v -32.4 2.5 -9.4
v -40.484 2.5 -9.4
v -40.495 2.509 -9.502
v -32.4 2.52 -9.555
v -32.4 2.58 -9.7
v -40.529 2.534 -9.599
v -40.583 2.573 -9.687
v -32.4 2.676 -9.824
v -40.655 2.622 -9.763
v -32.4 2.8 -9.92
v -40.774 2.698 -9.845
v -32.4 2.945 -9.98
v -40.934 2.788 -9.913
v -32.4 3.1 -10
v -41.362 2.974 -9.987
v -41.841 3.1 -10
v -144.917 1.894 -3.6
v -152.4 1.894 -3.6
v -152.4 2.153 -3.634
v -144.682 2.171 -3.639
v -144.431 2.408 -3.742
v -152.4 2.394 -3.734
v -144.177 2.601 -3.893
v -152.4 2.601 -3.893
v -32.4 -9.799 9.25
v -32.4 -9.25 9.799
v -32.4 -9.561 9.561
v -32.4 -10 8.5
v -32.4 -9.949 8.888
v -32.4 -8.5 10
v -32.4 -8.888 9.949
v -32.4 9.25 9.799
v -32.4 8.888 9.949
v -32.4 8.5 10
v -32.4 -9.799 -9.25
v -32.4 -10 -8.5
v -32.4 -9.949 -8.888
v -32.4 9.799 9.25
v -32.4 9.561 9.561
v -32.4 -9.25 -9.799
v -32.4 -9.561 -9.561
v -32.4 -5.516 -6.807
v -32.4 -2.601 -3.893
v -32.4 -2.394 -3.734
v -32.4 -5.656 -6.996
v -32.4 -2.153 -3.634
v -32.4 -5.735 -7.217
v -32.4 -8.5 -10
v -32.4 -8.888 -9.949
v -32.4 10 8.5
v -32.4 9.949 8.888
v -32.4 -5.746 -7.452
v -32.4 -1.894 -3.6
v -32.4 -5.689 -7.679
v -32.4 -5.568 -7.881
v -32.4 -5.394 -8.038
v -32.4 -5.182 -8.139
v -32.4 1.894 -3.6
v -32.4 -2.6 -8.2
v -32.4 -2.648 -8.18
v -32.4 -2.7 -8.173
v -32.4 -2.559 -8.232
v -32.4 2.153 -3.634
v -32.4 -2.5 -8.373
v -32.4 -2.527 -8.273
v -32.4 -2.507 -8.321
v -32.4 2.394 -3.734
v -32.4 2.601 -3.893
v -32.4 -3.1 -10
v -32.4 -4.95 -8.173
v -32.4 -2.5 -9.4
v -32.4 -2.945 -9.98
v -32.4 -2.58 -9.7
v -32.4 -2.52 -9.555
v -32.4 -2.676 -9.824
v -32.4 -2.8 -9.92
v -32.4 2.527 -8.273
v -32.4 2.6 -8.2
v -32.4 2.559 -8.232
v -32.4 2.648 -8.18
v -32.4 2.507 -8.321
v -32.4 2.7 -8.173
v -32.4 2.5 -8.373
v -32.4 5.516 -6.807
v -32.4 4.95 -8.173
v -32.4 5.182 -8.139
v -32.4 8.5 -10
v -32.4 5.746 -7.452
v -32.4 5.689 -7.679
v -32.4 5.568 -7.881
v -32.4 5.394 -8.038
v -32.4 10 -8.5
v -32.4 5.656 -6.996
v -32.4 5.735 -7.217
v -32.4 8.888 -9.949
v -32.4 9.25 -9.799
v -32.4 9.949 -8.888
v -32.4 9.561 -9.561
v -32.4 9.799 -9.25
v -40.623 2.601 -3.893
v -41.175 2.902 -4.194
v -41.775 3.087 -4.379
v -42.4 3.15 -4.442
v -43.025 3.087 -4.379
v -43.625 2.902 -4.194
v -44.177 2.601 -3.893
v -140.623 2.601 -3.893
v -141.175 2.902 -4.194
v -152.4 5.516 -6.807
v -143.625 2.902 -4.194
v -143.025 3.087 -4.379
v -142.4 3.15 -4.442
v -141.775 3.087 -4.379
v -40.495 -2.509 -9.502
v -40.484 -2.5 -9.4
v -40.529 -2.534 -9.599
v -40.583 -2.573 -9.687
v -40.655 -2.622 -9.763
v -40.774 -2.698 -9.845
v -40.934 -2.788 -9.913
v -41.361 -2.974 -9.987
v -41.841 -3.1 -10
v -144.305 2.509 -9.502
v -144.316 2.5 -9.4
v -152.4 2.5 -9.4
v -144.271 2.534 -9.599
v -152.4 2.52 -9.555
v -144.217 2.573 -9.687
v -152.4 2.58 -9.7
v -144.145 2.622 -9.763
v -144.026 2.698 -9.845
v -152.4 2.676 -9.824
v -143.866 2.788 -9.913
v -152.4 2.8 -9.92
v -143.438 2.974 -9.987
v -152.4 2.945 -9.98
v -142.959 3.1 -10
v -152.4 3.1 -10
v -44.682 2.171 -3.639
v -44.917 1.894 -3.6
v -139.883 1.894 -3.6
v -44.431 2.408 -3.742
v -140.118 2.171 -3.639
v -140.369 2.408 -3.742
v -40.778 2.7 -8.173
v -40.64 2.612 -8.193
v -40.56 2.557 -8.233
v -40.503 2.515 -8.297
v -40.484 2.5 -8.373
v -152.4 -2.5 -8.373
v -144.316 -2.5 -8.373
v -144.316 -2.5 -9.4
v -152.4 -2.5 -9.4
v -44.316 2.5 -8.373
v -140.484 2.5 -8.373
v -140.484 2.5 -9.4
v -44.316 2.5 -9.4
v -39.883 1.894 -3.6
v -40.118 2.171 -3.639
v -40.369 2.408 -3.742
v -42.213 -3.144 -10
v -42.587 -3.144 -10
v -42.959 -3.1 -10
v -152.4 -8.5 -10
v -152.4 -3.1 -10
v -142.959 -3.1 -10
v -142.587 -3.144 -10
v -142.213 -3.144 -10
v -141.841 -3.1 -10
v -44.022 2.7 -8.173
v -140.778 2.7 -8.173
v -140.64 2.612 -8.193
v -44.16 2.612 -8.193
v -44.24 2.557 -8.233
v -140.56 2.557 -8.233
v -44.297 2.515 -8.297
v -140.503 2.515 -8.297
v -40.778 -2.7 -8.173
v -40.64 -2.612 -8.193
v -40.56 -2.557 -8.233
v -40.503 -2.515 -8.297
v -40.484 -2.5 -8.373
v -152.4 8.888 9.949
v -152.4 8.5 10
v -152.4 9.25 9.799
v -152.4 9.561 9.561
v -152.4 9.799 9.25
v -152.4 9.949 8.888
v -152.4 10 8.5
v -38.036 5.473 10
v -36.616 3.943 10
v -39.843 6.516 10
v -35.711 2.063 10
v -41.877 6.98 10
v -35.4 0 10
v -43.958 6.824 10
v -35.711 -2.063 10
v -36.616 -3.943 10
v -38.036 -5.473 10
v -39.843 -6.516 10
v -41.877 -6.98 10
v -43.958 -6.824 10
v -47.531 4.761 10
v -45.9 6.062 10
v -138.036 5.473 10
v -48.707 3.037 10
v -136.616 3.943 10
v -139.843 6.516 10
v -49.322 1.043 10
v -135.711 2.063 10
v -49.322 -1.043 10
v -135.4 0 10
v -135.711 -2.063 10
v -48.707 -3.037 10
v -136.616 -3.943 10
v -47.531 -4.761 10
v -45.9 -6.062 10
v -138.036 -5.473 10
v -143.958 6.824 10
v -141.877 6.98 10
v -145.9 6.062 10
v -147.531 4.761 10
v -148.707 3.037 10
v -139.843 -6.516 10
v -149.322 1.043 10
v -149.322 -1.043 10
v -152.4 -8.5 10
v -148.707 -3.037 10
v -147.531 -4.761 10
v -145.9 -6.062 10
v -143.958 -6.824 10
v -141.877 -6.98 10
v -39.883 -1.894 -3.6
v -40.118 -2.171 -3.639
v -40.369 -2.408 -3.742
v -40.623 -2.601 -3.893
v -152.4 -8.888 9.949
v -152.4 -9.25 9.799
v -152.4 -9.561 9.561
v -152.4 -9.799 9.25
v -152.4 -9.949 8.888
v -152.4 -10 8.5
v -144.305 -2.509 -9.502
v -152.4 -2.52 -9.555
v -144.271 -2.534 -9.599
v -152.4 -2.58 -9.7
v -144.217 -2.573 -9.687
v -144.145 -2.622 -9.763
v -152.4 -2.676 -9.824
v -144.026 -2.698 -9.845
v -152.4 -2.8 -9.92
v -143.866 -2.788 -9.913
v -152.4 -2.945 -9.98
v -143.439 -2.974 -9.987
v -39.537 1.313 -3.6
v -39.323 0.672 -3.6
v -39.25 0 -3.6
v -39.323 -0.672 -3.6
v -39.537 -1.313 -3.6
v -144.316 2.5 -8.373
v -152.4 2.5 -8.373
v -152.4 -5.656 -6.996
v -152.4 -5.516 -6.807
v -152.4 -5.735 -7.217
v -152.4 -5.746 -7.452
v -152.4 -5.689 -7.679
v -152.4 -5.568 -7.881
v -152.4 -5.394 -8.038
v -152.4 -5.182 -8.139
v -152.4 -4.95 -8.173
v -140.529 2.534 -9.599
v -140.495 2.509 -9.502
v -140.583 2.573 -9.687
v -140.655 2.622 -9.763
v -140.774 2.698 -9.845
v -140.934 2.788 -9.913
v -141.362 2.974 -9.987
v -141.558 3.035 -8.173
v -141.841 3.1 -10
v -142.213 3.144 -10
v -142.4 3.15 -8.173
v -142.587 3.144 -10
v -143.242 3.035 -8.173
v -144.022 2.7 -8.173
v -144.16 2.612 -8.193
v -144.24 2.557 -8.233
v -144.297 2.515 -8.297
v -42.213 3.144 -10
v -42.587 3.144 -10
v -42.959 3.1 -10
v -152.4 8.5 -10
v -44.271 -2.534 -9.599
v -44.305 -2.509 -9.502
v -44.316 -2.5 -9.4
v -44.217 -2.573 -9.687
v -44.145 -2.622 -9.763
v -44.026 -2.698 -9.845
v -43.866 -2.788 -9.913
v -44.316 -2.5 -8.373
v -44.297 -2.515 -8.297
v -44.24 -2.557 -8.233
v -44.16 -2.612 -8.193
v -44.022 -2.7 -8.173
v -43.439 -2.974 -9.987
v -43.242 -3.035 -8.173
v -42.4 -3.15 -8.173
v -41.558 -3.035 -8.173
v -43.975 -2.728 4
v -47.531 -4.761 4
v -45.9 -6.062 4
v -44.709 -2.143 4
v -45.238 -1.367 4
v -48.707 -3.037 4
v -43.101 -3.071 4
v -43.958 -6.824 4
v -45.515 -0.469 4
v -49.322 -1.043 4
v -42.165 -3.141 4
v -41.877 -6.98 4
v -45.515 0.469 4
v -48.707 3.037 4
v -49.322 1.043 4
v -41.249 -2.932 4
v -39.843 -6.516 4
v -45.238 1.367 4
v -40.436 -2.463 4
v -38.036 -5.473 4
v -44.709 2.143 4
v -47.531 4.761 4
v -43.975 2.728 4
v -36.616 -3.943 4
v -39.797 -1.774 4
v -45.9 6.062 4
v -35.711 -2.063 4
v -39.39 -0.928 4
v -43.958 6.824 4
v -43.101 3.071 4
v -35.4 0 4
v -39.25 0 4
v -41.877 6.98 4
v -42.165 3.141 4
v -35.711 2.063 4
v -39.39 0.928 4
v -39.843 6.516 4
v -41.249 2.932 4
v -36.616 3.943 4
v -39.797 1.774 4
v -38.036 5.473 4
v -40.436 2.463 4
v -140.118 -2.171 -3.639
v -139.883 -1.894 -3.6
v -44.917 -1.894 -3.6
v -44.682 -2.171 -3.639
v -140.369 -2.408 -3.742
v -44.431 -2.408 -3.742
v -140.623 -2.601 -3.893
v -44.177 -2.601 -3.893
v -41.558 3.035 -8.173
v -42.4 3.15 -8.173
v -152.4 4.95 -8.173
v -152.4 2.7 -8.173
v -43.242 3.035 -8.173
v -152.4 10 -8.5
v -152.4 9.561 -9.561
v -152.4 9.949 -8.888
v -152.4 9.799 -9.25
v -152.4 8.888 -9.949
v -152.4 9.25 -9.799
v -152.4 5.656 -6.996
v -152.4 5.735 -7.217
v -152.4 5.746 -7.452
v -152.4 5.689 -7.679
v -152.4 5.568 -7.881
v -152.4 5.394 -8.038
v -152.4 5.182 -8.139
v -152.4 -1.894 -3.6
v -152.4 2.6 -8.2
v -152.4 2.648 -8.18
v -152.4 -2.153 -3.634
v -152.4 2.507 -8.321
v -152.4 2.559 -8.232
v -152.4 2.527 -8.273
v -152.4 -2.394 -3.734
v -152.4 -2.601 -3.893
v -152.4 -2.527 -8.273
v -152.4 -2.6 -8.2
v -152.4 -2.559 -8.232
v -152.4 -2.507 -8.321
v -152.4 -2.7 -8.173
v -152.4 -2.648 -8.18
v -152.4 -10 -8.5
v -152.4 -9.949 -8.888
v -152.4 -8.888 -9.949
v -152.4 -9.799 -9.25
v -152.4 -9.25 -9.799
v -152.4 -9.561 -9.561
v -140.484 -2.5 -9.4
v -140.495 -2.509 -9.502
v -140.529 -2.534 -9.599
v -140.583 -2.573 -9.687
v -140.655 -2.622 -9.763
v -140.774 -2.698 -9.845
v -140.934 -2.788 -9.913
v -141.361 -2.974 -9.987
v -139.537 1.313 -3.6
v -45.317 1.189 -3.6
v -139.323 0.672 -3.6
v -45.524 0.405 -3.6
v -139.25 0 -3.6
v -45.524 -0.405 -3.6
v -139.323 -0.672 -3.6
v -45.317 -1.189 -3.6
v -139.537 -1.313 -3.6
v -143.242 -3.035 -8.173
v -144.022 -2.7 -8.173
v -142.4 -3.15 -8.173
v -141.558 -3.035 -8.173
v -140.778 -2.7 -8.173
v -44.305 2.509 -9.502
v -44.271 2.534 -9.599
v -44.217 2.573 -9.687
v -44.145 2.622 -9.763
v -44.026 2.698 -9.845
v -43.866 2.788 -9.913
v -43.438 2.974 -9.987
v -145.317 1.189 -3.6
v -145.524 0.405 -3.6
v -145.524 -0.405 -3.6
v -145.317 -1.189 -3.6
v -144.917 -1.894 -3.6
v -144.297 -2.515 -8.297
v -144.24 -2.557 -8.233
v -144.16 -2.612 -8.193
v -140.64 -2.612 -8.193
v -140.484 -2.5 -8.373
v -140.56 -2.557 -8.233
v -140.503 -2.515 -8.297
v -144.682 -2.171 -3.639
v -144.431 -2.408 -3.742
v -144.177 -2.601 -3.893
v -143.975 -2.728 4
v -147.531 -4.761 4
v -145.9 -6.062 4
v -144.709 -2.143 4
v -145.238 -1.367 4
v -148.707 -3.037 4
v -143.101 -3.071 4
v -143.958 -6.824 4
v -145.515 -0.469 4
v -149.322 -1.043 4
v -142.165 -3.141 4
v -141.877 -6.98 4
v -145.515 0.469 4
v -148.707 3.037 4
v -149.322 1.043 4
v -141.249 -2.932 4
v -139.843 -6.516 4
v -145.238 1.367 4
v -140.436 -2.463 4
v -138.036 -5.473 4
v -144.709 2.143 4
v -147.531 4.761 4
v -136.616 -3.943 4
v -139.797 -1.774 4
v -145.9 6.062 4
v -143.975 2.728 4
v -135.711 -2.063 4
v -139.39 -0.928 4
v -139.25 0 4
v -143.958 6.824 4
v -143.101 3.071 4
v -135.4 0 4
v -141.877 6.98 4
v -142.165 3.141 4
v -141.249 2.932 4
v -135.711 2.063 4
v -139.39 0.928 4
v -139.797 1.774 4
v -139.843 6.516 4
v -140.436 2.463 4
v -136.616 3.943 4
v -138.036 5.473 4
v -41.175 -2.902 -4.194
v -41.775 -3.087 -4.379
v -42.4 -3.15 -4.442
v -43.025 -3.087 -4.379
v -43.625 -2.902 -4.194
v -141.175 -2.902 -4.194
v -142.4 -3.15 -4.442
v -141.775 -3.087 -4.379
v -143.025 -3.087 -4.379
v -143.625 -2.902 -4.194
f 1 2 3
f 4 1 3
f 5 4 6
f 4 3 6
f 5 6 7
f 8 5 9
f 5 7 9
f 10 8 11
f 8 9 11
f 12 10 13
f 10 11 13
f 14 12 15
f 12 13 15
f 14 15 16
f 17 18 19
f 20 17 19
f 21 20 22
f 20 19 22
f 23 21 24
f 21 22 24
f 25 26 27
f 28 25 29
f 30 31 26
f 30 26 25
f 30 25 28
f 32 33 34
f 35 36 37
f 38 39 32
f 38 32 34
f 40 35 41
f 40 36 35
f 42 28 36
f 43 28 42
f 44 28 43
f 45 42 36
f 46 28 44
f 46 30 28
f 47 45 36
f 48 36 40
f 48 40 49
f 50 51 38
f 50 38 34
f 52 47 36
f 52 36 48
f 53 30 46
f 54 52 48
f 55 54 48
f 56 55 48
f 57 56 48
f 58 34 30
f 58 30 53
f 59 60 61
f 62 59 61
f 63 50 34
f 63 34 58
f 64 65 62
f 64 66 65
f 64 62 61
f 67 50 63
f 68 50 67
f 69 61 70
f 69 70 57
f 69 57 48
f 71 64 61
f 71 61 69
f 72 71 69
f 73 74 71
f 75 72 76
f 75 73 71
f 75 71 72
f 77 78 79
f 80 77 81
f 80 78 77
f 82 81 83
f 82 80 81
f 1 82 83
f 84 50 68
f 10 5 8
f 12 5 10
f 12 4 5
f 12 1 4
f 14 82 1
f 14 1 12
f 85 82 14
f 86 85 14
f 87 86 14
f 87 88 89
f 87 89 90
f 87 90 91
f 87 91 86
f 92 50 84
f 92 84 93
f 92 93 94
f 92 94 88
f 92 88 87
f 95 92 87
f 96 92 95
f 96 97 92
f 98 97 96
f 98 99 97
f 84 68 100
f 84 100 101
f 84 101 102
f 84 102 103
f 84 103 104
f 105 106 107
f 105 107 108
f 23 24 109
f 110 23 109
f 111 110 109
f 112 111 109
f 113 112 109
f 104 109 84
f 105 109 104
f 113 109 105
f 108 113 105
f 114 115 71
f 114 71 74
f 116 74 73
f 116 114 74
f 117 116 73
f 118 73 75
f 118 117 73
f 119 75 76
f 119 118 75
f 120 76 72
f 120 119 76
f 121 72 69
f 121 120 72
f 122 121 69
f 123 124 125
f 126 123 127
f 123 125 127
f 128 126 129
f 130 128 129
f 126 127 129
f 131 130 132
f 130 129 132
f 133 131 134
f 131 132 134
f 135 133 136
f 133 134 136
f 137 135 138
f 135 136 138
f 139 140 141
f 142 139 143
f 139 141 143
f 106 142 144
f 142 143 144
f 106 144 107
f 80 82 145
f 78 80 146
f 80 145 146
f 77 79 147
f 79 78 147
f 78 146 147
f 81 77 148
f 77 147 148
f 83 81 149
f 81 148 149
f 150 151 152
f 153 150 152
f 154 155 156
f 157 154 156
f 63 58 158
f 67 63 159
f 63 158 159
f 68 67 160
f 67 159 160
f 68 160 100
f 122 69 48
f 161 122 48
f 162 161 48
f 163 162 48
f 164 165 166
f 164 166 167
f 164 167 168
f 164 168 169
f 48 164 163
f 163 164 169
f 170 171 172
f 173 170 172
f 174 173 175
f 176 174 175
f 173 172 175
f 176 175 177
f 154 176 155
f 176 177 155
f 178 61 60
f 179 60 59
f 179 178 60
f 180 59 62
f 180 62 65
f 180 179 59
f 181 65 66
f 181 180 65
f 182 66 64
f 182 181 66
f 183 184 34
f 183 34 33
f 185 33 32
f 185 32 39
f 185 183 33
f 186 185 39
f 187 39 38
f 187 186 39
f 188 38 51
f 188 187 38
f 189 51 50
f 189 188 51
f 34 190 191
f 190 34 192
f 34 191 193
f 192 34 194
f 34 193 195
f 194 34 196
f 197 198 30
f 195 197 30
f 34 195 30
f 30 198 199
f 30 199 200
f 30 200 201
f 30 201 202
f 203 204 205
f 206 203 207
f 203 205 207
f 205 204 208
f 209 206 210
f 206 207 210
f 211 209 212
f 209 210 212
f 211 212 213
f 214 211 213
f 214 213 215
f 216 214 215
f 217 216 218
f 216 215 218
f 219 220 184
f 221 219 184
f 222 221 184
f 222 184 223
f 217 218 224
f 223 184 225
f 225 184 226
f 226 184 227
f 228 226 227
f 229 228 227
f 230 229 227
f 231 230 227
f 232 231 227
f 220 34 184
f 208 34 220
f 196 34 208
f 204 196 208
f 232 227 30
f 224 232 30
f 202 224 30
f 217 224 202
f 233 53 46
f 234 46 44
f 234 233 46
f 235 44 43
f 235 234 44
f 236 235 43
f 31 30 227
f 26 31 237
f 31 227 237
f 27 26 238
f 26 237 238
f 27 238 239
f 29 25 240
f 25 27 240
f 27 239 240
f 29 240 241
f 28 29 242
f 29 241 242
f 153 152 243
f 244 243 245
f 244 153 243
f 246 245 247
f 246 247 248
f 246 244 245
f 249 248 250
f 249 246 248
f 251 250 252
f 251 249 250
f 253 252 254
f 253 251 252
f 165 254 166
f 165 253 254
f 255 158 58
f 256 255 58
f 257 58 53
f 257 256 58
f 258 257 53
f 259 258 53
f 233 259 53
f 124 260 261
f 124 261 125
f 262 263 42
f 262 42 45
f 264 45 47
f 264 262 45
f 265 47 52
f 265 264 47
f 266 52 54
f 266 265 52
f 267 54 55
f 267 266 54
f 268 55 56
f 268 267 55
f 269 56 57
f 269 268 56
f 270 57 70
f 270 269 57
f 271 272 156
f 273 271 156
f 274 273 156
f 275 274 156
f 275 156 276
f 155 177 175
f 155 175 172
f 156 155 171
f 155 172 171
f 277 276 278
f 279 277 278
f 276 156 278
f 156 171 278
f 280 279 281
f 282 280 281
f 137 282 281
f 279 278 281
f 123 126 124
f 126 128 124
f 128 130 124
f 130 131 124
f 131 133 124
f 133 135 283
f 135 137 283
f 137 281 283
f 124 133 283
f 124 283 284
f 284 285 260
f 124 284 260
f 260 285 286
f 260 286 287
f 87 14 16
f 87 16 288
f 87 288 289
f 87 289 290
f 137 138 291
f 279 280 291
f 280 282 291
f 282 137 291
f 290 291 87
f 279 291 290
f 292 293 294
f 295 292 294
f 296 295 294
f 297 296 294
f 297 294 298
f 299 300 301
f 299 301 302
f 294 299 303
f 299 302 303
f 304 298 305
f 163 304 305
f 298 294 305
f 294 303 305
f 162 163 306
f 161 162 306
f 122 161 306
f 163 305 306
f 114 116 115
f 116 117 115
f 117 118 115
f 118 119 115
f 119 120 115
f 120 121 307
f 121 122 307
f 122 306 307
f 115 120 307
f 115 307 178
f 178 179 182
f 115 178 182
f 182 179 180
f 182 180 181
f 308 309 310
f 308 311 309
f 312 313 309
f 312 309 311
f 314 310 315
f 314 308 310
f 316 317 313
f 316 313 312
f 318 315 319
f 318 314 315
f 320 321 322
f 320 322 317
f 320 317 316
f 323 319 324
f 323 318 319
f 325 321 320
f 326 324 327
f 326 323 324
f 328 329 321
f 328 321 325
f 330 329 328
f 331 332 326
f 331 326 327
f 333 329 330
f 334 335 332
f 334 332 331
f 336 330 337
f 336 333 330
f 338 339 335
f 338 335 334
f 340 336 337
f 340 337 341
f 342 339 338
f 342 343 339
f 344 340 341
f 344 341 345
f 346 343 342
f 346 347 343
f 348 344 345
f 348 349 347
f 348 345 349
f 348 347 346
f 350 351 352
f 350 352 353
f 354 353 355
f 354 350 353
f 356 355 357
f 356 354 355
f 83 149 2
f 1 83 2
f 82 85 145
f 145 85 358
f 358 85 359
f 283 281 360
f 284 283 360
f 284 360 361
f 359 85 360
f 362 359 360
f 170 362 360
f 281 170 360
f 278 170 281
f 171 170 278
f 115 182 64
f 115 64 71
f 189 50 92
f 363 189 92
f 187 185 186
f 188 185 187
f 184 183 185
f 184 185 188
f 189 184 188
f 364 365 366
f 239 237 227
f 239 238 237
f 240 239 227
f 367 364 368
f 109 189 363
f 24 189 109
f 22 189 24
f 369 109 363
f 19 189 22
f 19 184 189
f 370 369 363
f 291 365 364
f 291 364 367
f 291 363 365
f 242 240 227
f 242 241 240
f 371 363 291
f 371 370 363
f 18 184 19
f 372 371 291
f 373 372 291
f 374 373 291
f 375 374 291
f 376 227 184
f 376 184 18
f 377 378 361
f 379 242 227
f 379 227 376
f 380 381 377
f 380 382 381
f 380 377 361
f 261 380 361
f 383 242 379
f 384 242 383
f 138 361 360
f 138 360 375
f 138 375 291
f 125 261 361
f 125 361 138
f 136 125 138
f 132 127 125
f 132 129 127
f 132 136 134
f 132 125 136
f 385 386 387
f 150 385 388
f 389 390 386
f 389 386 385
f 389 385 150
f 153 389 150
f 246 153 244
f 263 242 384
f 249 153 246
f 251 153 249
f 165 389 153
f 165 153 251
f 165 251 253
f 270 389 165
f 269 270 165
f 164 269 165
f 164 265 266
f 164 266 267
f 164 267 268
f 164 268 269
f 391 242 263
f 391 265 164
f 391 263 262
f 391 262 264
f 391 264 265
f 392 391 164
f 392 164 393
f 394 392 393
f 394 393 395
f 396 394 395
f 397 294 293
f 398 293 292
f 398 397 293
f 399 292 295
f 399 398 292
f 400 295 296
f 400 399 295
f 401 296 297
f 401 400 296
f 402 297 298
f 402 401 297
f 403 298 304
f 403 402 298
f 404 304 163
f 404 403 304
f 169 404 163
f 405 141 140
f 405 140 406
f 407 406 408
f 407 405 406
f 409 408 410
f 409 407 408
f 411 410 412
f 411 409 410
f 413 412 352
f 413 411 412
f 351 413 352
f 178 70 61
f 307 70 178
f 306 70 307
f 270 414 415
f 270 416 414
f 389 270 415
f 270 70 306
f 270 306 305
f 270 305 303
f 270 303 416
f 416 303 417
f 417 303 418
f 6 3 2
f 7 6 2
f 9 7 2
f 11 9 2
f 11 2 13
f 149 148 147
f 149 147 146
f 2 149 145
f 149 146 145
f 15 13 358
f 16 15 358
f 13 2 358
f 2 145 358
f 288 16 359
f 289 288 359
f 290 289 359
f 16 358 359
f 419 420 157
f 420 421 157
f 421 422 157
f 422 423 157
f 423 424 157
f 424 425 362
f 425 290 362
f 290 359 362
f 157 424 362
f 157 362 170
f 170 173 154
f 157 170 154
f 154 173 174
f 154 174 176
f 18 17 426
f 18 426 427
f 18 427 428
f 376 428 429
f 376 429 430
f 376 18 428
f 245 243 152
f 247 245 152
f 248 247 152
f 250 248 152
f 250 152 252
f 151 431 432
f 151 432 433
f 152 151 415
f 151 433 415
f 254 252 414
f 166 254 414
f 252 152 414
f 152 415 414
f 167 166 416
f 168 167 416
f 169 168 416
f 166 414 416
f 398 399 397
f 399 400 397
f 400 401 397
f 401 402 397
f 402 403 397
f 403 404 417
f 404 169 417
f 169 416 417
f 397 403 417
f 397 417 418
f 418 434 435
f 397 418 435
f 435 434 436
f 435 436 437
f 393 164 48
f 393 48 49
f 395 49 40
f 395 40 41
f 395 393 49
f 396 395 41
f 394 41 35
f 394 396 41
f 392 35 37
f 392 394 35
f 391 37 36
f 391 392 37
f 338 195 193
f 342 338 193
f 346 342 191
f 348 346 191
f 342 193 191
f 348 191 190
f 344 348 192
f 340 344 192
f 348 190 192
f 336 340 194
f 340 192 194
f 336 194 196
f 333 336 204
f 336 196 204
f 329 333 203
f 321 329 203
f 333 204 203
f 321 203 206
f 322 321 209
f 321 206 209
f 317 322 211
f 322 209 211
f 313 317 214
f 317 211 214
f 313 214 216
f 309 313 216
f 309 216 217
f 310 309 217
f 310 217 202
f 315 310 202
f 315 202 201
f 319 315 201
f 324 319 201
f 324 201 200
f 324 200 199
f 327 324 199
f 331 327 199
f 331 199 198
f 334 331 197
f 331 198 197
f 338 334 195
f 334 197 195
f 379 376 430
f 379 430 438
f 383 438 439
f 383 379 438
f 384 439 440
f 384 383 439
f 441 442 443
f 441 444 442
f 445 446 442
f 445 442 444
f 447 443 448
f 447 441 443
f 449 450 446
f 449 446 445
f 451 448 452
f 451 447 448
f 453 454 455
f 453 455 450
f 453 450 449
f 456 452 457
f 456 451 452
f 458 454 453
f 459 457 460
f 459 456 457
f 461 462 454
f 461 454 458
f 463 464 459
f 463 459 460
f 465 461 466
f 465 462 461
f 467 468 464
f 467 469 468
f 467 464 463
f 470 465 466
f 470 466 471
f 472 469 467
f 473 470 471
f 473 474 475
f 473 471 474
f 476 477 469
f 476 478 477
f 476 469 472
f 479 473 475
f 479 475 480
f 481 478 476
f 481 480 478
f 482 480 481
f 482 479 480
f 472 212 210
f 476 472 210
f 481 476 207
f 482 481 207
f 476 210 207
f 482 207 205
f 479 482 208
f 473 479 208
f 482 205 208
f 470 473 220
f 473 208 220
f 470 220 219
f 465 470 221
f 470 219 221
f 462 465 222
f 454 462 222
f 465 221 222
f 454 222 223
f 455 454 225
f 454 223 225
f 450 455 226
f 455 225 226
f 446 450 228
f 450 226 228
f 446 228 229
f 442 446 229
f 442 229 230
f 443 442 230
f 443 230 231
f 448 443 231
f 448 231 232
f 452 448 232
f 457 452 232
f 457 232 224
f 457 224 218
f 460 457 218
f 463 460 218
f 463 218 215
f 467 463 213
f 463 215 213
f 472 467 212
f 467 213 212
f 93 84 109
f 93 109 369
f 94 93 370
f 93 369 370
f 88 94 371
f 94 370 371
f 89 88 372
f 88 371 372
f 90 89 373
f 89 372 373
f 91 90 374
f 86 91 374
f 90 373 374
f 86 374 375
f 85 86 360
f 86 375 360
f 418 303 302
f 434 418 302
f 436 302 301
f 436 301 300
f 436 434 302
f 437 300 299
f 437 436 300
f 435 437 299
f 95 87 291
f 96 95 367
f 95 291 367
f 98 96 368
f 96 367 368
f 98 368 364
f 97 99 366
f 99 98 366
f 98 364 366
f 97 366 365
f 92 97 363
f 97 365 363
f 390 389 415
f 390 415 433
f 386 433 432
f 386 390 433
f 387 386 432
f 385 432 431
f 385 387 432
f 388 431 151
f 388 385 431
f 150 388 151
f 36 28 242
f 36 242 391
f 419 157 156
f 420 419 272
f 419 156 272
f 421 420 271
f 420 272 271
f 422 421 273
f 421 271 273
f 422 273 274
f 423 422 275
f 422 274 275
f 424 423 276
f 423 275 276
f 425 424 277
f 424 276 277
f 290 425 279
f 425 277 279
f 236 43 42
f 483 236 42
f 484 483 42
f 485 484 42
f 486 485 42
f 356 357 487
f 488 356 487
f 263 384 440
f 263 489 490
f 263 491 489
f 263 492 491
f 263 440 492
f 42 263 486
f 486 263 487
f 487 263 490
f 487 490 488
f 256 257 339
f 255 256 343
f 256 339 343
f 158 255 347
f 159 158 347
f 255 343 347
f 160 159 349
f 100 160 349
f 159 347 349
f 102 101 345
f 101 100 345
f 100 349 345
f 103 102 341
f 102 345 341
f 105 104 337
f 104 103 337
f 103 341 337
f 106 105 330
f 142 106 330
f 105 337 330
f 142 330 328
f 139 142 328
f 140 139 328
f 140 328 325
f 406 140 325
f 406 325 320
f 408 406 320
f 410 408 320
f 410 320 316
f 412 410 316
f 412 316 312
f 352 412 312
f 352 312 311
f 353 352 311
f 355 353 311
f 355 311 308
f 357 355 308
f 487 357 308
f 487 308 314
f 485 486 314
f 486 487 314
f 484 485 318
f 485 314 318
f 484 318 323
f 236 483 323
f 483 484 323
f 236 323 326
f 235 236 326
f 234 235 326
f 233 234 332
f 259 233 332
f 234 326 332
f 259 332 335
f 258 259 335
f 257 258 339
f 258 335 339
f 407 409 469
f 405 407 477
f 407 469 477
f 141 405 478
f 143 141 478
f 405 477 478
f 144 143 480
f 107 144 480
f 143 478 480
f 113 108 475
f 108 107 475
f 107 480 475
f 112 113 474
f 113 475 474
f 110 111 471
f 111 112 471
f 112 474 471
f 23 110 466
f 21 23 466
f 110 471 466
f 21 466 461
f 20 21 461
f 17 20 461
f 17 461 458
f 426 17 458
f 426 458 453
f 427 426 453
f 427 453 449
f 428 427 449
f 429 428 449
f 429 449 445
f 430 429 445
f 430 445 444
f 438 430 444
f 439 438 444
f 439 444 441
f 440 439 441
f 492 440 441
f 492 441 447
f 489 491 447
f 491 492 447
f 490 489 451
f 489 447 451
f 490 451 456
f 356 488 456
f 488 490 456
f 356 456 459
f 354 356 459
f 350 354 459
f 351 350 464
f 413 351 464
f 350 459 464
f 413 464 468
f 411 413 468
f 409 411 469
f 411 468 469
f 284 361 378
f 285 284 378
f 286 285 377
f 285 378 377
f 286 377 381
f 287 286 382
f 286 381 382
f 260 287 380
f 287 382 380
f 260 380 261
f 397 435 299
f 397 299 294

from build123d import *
from build123d.topology import SkipClean

# Parameters (mm, degrees)
BOSS_EXTRUDE1_DEPTH      = 152.4
BOSS_EXTRUDE1_DEPTH_BACK = 152.4
SKETCH4_R                = 2.15
BOSS_EXTRUDE2_DEPTH      = 95.2
SKETCH5_W                = 30
SKETCH5_H                = 30
CUT_EXTRUDE1_DEPTH       = 280
BOSS_EXTRUDE5_START      = -120
BOSS_EXTRUDE5_DEPTH      = 120
SKETCH9_R                = 3.15
CUT_EXTRUDE2_DEPTH       = 155.031685052
SKETCH10_R               = 7
CUT_EXTRUDE3_DEPTH       = 6


with BuildPart() as part:
    # Sketch3 → Boss-Extrude1 (new, two sides: drawn at the far end of the back side and taken through both)
    with BuildSketch(Plane(origin=(0, 0, 0), x_dir=(0, 0, -1), z_dir=(1, 0, 0)).offset(-BOSS_EXTRUDE1_DEPTH_BACK)):
        with BuildLine():
            Line((-5.515685425, 6.807463915), (-2.601114729, 3.892893219))
            ThreePointArc((-2.601114729, 3.892893219), (-2.27669138, 3.676120467), (-1.894007948, 3.6))
            Line((-1.894007948, 3.6), (0, 3.6))
            Line((0, 3.6), (0, 2.15))
            ThreePointArc((0, 2.15), (-1.52027958, 1.52027958), (-2.15, 0))
            Line((-2.15, 0), (-3.6, 0))
            Line((-3.6, 0), (-3.6, 1.894007948))
            ThreePointArc((-3.6, 1.894007948), (-3.676120467, 2.27669138), (-3.892893219, 2.601114729))
            Line((-3.892893219, 2.601114729), (-6.807463915, 5.515685425))
            ThreePointArc((-6.807463915, 5.515685425), (-7.679296086, 5.689103626), (-8.17314934, 4.95))
            Line((-8.17314934, 4.95), (-8.17314934, 2.7))
            ThreePointArc((-8.17314934, 2.7), (-8.231727984, 2.558578644), (-8.37314934, 2.5))
            Line((-8.37314934, 2.5), (-9.4, 2.5))
            ThreePointArc((-9.4, 2.5), (-9.824264069, 2.675735931), (-10, 3.1))
            Line((-10, 3.1), (-10, 8.5))
            ThreePointArc((-10, 8.5), (-9.560660172, 9.560660172), (-8.5, 10))
            Line((-8.5, 10), (-3.1, 10))
            ThreePointArc((-3.1, 10), (-2.675735931, 9.824264069), (-2.5, 9.4))
            Line((-2.5, 9.4), (-2.5, 8.37314934))
            ThreePointArc((-2.5, 8.37314934), (-2.558578644, 8.231727984), (-2.7, 8.17314934))
            Line((-2.7, 8.17314934), (-4.95, 8.17314934))
            ThreePointArc((-4.95, 8.17314934), (-5.689103626, 7.679296086), (-5.515685425, 6.807463915))
        make_face()
    extrude(amount=BOSS_EXTRUDE1_DEPTH + BOSS_EXTRUDE1_DEPTH_BACK)

    # Mirror1: part across plane


with BuildPart() as part_1:
    add(part.part)
    add(part.part.mirror(Plane.ZX))

    # Mirror2: part across plane


with BuildPart() as part_2:
    add(part_1.part)
    add(part_1.part.mirror(Plane.XY))

    # Sketch4 → Boss-Extrude2 (add)
    with SkipClean():  # the faces are left unmerged after this step: merging them gives an invalid solid
        with BuildSketch(Plane(origin=(152.4, 0, 0), x_dir=(0, 0, -1), z_dir=(1, 0, 0))):
            with BuildLine():
                Line((1.894007948, 3.6), (-1.894007948, 3.6))
                ThreePointArc((-1.894007948, 3.6), (-2.27669138, 3.676120467), (-2.601114729, 3.892893219))
                Line((-2.601114729, 3.892893219), (-5.515685425, 6.807463915))
                ThreePointArc((-5.515685425, 6.807463915), (-5.689103626, 7.679296086), (-4.95, 8.17314934))
                Line((-4.95, 8.17314934), (-2.7, 8.17314934))
                ThreePointArc((-2.7, 8.17314934), (-2.558578644, 8.231727984), (-2.5, 8.37314934))
                Line((-2.5, 8.37314934), (-2.5, 9.4))
                ThreePointArc((-2.5, 9.4), (-2.675735931, 9.824264069), (-3.1, 10))
                Line((-3.1, 10), (-8.5, 10))
                ThreePointArc((-8.5, 10), (-9.560660172, 9.560660172), (-10, 8.5))
                Line((-10, 8.5), (-10, 3.1))
                ThreePointArc((-10, 3.1), (-9.824264069, 2.675735931), (-9.4, 2.5))
                Line((-9.4, 2.5), (-8.37314934, 2.5))
                ThreePointArc((-8.37314934, 2.5), (-8.231727984, 2.558578644), (-8.17314934, 2.7))
                Line((-8.17314934, 2.7), (-8.17314934, 4.95))
                ThreePointArc((-8.17314934, 4.95), (-7.679296086, 5.689103626), (-6.807463915, 5.515685425))
                Line((-6.807463915, 5.515685425), (-3.892893219, 2.601114729))
                ThreePointArc((-3.892893219, 2.601114729), (-3.676120467, 2.27669138), (-3.6, 1.894007948))
                Line((-3.6, 1.894007948), (-3.6, -1.894007948))
                ThreePointArc((-3.6, -1.894007948), (-3.676120467, -2.27669138), (-3.892893219, -2.601114729))
                Line((-3.892893219, -2.601114729), (-6.807463915, -5.515685425))
                ThreePointArc((-6.807463915, -5.515685425), (-7.679296086, -5.689103626), (-8.17314934, -4.95))
                Line((-8.17314934, -4.95), (-8.17314934, -2.7))
                ThreePointArc((-8.17314934, -2.7), (-8.231727984, -2.558578644), (-8.37314934, -2.5))
                Line((-8.37314934, -2.5), (-9.4, -2.5))
                ThreePointArc((-9.4, -2.5), (-9.824264069, -2.675735931), (-10, -3.1))
                Line((-10, -3.1), (-10, -8.5))
                ThreePointArc((-10, -8.5), (-9.560660172, -9.560660172), (-8.5, -10))
                Line((-8.5, -10), (-3.1, -10))
                ThreePointArc((-3.1, -10), (-2.675735931, -9.824264069), (-2.5, -9.4))
                Line((-2.5, -9.4), (-2.5, -8.37314934))
                ThreePointArc((-2.5, -8.37314934), (-2.558578644, -8.231727984), (-2.7, -8.17314934))
                Line((-2.7, -8.17314934), (-4.95, -8.17314934))
                ThreePointArc((-4.95, -8.17314934), (-5.689103626, -7.679296086), (-5.515685425, -6.807463915))
                Line((-5.515685425, -6.807463915), (-2.601114729, -3.892893219))
                ThreePointArc((-2.601114729, -3.892893219), (-2.27669138, -3.676120467), (-1.894007948, -3.6))
                Line((-1.894007948, -3.6), (1.894007948, -3.6))
                ThreePointArc((1.894007948, -3.6), (2.27669138, -3.676120467), (2.601114729, -3.892893219))
                Line((2.601114729, -3.892893219), (5.515685425, -6.807463915))
                ThreePointArc((5.515685425, -6.807463915), (5.689103626, -7.679296086), (4.95, -8.17314934))
                Line((4.95, -8.17314934), (2.7, -8.17314934))
                ThreePointArc((2.7, -8.17314934), (2.558578644, -8.231727984), (2.5, -8.37314934))
                Line((2.5, -8.37314934), (2.5, -9.4))
                ThreePointArc((2.5, -9.4), (2.675735931, -9.824264069), (3.1, -10))
                Line((3.1, -10), (8.5, -10))
                ThreePointArc((8.5, -10), (9.560660172, -9.560660172), (10, -8.5))
                Line((10, -8.5), (10, -3.1))
                ThreePointArc((10, -3.1), (9.824264069, -2.675735931), (9.4, -2.5))
                Line((9.4, -2.5), (8.37314934, -2.5))
                ThreePointArc((8.37314934, -2.5), (8.231727984, -2.558578644), (8.17314934, -2.7))
                Line((8.17314934, -2.7), (8.17314934, -4.95))
                ThreePointArc((8.17314934, -4.95), (7.679296086, -5.689103626), (6.807463915, -5.515685425))
                Line((6.807463915, -5.515685425), (3.892893219, -2.601114729))
                ThreePointArc((3.892893219, -2.601114729), (3.676120467, -2.27669138), (3.6, -1.894007948))
                Line((3.6, -1.894007948), (3.6, 1.894007948))
                ThreePointArc((3.6, 1.894007948), (3.676120467, 2.27669138), (3.892893219, 2.601114729))
                Line((3.892893219, 2.601114729), (6.807463915, 5.515685425))
                ThreePointArc((6.807463915, 5.515685425), (7.679296086, 5.689103626), (8.17314934, 4.95))
                Line((8.17314934, 4.95), (8.17314934, 2.7))
                ThreePointArc((8.17314934, 2.7), (8.231727984, 2.558578644), (8.37314934, 2.5))
                Line((8.37314934, 2.5), (9.4, 2.5))
                ThreePointArc((9.4, 2.5), (9.824264069, 2.675735931), (10, 3.1))
                Line((10, 3.1), (10, 8.5))
                ThreePointArc((10, 8.5), (9.560660172, 9.560660172), (8.5, 10))
                Line((8.5, 10), (3.1, 10))
                ThreePointArc((3.1, 10), (2.675735931, 9.824264069), (2.5, 9.4))
                Line((2.5, 9.4), (2.5, 8.37314934))
                ThreePointArc((2.5, 8.37314934), (2.558578644, 8.231727984), (2.7, 8.17314934))
                Line((2.7, 8.17314934), (4.95, 8.17314934))
                ThreePointArc((4.95, 8.17314934), (5.689103626, 7.679296086), (5.515685425, 6.807463915))
                Line((5.515685425, 6.807463915), (2.601114729, 3.892893219))
                ThreePointArc((2.601114729, 3.892893219), (2.27669138, 3.676120467), (1.894007948, 3.6))
            make_face()
            Circle(SKETCH4_R, mode=Mode.SUBTRACT)
        extrude(amount=BOSS_EXTRUDE2_DEPTH)

    # Sketch5 → Cut-Extrude1 (cut)
    with BuildSketch(Plane(origin=(247.6, 0, 0), x_dir=(0, 0, -1), z_dir=(1, 0, 0))):
        Rectangle(SKETCH5_W, SKETCH5_H)
    extrude(amount=-CUT_EXTRUDE1_DEPTH, mode=Mode.SUBTRACT)

    # Sketch8 → Boss-Extrude5 (add)
    with BuildSketch(Plane(origin=(-32.4, 0, 0), x_dir=(0, 0, -1), z_dir=(1, 0, 0)).offset(BOSS_EXTRUDE5_START)):
        with BuildLine():
            Line((-8.5, 10), (8.5, 10))
            ThreePointArc((8.5, 10), (9.560660172, 9.560660172), (10, 8.5))
            Line((10, 8.5), (10, 3.1))
            ThreePointArc((10, 3.1), (9.824264069, 2.675735931), (9.4, 2.5))
            Line((9.4, 2.5), (8.37314934, 2.5))
            ThreePointArc((8.37314934, 2.5), (8.231727984, 2.558578644), (8.17314934, 2.7))
            Line((8.17314934, 2.7), (8.17314934, 4.95))
            ThreePointArc((8.17314934, 4.95), (7.679296086, 5.689103626), (6.807463915, 5.515685425))
            Line((6.807463915, 5.515685425), (3.892893219, 2.601114729))
            ThreePointArc((3.892893219, 2.601114729), (3.676120467, 2.27669138), (3.6, 1.894007948))
            Line((3.6, 1.894007948), (3.6, -1.894007948))
            ThreePointArc((3.6, -1.894007948), (3.676120467, -2.27669138), (3.892893219, -2.601114729))
            Line((3.892893219, -2.601114729), (6.807463915, -5.515685425))
            ThreePointArc((6.807463915, -5.515685425), (7.679296086, -5.689103626), (8.17314934, -4.95))
            Line((8.17314934, -4.95), (8.17314934, -2.7))
            ThreePointArc((8.17314934, -2.7), (8.231727984, -2.558578644), (8.37314934, -2.5))
            Line((8.37314934, -2.5), (9.4, -2.5))
            ThreePointArc((9.4, -2.5), (9.824264069, -2.675735931), (10, -3.1))
            Line((10, -3.1), (10, -8.5))
            ThreePointArc((10, -8.5), (9.560660172, -9.560660172), (8.5, -10))
            Line((8.5, -10), (-8.5, -10))
            ThreePointArc((-8.5, -10), (-9.560660172, -9.560660172), (-10, -8.5))
            Line((-10, -8.5), (-10, 8.5))
            ThreePointArc((-10, 8.5), (-9.560660172, 9.560660172), (-8.5, 10))
        make_face()
    extrude(amount=BOSS_EXTRUDE5_DEPTH)

    # Sketch9 → Cut-Extrude2 (cut, through all)
    with BuildSketch(Plane.XY.offset(10)):
        with Locations((-142.4, 0)):
            Circle(SKETCH9_R)
        with Locations((-42.4, 0)):
            Circle(SKETCH9_R)
    extrude(amount=-CUT_EXTRUDE2_DEPTH, mode=Mode.SUBTRACT)

    # Sketch10 → Cut-Extrude3 (cut)
    with BuildSketch(Plane.XY.offset(10)):
        with Locations((-142.4, 0)):
            Circle(SKETCH10_R)
        with Locations((-42.4, 0)):
            Circle(SKETCH10_R)
    extrude(amount=-CUT_EXTRUDE3_DEPTH, mode=Mode.SUBTRACT)


solid = part_2.part
